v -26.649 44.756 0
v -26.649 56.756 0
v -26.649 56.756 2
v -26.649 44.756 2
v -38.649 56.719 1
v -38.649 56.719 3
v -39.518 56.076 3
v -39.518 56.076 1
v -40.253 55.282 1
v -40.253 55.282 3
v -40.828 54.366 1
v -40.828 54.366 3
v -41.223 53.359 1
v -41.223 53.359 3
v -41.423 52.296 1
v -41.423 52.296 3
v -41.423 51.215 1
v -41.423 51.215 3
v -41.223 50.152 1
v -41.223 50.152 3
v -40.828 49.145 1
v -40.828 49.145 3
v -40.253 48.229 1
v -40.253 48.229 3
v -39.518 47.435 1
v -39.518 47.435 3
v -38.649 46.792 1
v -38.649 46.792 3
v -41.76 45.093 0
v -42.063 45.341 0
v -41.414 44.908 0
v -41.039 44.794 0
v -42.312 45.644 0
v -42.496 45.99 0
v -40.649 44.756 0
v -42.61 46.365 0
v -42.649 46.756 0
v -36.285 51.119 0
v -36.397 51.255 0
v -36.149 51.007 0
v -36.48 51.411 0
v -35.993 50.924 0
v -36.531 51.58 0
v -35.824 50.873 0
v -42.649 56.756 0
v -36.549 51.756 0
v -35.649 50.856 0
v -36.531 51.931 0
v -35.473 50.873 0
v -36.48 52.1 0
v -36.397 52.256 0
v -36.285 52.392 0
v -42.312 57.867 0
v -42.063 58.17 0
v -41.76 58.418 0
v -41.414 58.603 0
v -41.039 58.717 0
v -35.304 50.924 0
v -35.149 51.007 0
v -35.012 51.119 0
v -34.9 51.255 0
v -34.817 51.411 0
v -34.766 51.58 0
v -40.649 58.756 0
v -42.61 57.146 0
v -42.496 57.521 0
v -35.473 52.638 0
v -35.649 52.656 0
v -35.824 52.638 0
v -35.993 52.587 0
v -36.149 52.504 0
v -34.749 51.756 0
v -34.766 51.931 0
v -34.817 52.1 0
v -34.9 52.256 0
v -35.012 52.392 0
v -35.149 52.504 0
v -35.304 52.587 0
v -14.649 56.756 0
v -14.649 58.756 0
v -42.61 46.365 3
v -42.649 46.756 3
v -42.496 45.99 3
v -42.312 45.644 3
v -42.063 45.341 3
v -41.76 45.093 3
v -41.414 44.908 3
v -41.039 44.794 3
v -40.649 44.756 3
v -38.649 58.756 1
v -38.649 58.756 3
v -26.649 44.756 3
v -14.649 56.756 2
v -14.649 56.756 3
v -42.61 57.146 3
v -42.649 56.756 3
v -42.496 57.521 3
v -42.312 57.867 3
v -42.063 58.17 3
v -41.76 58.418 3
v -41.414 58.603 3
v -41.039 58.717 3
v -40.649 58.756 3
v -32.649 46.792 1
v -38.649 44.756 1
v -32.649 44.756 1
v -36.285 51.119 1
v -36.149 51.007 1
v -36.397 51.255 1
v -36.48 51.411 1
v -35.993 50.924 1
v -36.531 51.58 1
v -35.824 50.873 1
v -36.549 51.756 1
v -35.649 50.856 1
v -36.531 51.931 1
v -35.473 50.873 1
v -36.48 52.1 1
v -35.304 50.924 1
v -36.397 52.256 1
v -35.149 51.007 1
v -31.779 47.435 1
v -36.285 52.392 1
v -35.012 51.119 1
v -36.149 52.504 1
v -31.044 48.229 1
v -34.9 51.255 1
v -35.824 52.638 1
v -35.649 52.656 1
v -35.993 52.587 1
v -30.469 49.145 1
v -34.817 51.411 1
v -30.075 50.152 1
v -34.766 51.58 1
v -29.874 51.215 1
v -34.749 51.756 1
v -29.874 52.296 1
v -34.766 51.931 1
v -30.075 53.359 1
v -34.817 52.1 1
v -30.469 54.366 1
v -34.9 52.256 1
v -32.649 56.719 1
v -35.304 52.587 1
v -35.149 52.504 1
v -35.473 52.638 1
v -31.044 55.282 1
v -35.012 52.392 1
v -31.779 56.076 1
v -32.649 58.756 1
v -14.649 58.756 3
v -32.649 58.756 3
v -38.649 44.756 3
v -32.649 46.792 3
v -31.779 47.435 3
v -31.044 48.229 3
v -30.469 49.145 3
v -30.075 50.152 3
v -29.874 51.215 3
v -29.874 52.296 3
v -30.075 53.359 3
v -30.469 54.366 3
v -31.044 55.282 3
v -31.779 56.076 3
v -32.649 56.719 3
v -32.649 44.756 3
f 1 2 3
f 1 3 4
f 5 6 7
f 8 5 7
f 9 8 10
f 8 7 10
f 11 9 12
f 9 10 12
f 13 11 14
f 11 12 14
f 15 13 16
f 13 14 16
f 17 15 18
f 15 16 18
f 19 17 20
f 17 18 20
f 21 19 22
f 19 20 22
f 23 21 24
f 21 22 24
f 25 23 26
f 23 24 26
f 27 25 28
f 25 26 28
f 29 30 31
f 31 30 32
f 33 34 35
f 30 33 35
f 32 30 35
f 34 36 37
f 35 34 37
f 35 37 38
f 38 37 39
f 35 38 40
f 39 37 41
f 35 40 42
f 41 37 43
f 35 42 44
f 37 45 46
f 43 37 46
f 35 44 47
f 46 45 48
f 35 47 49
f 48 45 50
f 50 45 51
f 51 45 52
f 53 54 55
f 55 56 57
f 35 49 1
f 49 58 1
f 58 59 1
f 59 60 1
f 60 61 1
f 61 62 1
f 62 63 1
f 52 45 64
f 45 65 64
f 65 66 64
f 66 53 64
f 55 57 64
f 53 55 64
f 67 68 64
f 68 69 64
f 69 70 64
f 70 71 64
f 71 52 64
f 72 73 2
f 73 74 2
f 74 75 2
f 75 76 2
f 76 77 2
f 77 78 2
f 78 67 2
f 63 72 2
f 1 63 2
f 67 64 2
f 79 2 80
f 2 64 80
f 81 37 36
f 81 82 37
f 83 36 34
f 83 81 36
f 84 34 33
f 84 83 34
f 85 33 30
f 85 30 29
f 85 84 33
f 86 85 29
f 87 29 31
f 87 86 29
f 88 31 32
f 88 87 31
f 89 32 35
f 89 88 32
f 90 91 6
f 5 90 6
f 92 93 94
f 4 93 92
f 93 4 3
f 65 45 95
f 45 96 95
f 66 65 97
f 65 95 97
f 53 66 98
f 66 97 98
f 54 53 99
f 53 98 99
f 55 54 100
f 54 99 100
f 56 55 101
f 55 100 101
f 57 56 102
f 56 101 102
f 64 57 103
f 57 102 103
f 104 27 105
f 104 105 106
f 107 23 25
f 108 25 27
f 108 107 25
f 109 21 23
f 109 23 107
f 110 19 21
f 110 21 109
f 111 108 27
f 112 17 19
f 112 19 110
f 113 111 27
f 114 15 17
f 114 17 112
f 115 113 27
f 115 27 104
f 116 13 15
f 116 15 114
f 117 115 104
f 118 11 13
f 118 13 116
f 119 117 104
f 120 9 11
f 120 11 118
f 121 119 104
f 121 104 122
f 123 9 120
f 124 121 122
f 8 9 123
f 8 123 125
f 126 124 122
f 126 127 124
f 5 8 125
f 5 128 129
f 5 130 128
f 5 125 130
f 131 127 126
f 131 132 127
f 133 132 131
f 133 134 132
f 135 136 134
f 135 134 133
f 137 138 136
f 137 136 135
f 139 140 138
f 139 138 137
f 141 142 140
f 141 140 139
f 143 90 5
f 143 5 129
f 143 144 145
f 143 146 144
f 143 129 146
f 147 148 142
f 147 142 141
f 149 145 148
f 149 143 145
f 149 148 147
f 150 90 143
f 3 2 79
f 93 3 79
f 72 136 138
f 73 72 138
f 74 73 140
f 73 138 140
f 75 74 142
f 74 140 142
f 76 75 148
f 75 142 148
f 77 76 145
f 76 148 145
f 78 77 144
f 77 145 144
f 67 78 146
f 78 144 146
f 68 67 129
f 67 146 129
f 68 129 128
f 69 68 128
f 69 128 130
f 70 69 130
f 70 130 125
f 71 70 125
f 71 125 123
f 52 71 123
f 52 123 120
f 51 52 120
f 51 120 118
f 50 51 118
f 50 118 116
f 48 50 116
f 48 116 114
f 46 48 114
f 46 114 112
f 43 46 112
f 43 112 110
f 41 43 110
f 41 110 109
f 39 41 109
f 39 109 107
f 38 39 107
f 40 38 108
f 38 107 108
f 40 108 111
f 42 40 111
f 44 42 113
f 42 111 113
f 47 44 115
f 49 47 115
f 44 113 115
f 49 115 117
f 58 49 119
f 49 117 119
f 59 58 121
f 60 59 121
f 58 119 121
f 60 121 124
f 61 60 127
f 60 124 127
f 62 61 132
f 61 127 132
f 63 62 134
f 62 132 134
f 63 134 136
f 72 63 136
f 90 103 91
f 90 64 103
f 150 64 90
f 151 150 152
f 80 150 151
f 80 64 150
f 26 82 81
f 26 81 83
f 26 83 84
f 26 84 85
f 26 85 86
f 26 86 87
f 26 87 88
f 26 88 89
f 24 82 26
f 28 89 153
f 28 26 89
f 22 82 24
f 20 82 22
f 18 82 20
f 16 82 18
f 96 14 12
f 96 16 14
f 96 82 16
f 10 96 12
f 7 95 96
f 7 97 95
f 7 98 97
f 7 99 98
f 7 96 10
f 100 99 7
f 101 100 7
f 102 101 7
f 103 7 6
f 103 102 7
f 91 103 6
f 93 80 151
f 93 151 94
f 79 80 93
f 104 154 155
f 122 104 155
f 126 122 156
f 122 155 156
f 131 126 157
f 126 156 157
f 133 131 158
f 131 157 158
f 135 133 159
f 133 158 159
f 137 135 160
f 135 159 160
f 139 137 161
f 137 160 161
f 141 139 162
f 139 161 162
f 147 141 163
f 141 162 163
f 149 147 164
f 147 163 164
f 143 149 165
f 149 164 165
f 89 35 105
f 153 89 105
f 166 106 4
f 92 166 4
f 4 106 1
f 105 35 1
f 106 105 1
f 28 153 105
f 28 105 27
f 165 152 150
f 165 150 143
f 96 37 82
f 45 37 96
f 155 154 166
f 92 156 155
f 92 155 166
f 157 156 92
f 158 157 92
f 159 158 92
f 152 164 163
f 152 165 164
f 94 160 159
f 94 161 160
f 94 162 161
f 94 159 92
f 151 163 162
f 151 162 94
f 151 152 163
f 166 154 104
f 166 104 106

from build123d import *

# Parameters (mm, degrees)
SKETCH006_W     = 14
SKETCH006_H     = 14
PAD002_DEPTH    = 3
POCKET004_DEPTH = 2
SKETCH008_R     = 0.9
POCKET005_DEPTH = 1.001
PAD_DEPTH       = 3
SKETCH010_W     = 12
SKETCH010_H     = 12
POCKET_DEPTH    = 2
FILLET_R        = 2


with BuildPart() as pushpin_unit:
    # Sketch006 → Pad002 (new body)
    with BuildSketch(Plane.XY):
        Rectangle(SKETCH006_W, SKETCH006_H)
    extrude(amount=PAD002_DEPTH)

    # Sketch007 → Pocket004 (cut)
    with BuildSketch(Plane.XY.offset(3)):
        with BuildLine():
            Line((-3, 7), (-3, 4.963869))
            ThreePointArc((-3, 4.963869), (-5.8, 0), (-3, -4.963869))
            Line((-3, -7), (-3, -4.963869))
            Line((3, -7), (-3, -7))
            Line((3, -4.963869), (3, -7))
            ThreePointArc((3, -4.963869), (5.8, 0), (3, 4.963869))
            Line((3, 7), (3, 4.963869))
            Line((-3, 7), (3, 7))
        make_face()
    extrude(amount=-POCKET004_DEPTH, mode=Mode.SUBTRACT)

    # Sketch008 → Pocket005 (cut, through all)
    with BuildSketch(Plane.XY.offset(1)):
        Circle(SKETCH008_R)
    extrude(amount=-POCKET005_DEPTH, mode=Mode.SUBTRACT)


with BuildPart() as corner_holder_single:
    # Sketch → Pad (new body)
    with BuildSketch(Plane.XY):
        Polygon((-7, -7), (-7, 7), (7, 7), (7, 5), (-5, -7), align=None)
    extrude(amount=PAD_DEPTH)

    # Sketch010 → Pocket (cut)
    with BuildSketch(Plane(origin=(0, 0, 0), x_dir=(1, 0, 0), z_dir=(0, 0, -1))):
        with Locations((1, 1)):
            Rectangle(SKETCH010_W, SKETCH010_H)
    extrude(amount=-POCKET_DEPTH, mode=Mode.SUBTRACT)


with BuildPart() as corner_holder_single_1:
    # Clone placement: moved
    add(corner_holder_single.part.moved(Location((14, 0, 0))))

    # Fusion: union pushpin-unit
    add(pushpin_unit.part)

    # Fillet
    fillet_edges = [corner_holder_single_1.edges().sort_by_distance(p)[0] for p in [
        (-7, -7, 1.5),
        (-7, 7, 1.5),
    ]]
    fillet(fillet_edges, radius=FILLET_R)


with BuildPart() as corner_holder_single_2:
    # Clone001004 placement: moved
    add(corner_holder_single_1.part.moved(Location((-35.64867, 51.755502, 0))))


solid = corner_holder_single_2.part
